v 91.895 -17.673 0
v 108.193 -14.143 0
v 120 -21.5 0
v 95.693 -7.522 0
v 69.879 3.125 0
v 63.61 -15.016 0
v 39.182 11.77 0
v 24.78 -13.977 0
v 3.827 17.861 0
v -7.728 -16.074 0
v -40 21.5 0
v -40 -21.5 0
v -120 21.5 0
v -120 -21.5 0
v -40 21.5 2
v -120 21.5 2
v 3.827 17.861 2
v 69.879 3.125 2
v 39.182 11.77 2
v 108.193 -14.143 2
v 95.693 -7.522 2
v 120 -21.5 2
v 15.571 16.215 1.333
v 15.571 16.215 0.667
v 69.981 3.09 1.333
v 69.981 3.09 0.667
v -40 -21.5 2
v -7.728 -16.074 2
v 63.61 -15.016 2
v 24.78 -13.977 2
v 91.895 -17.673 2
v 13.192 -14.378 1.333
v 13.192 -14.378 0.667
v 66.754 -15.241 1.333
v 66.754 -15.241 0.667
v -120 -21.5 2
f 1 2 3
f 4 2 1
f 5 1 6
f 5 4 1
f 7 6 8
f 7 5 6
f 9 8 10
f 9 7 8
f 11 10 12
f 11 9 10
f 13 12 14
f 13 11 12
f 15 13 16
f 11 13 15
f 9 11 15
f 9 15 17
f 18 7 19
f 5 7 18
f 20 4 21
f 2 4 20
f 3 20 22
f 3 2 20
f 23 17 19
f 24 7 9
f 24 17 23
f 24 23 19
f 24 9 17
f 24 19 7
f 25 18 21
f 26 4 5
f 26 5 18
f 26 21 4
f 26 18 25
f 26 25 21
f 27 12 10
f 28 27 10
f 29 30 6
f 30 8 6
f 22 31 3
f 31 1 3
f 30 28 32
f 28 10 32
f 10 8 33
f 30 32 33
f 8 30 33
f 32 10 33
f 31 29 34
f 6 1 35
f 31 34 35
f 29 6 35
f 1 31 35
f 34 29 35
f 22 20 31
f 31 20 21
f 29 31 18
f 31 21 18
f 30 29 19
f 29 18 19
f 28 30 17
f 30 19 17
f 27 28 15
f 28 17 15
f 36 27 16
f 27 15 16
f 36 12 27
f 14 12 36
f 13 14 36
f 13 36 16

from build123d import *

# Parameters (mm, degrees)
BOSS_EXTRUDE1_DEPTH = 2


with BuildPart() as part:
    # Sketch1 → Boss-Extrude1 (new body)
    with BuildSketch(Plane.XY):
        with BuildLine():
            Line((-120, 21.5), (-40, 21.5))
            add(Edge.make_bspline(
                [(-40, 21.5), (15.075510425, 18.925789545), (73.253217354, 10.030346032), (120, -21.5)],
                knots=[0, 0, 0, 0, 1, 1, 1, 1], degree=3))
            add(Edge.make_bspline(
                [(-40, -21.5), (12.778539399, -9.52302093), (67.141346764, -13.406218695), (120, -21.5)],
                knots=[0, 0, 0, 0, 1, 1, 1, 1], degree=3))
            Line((-40, -21.5), (-120, -21.5))
            Line((-120, -21.5), (-120, 21.5))
        make_face()
    extrude(amount=BOSS_EXTRUDE1_DEPTH)


solid = part.part
